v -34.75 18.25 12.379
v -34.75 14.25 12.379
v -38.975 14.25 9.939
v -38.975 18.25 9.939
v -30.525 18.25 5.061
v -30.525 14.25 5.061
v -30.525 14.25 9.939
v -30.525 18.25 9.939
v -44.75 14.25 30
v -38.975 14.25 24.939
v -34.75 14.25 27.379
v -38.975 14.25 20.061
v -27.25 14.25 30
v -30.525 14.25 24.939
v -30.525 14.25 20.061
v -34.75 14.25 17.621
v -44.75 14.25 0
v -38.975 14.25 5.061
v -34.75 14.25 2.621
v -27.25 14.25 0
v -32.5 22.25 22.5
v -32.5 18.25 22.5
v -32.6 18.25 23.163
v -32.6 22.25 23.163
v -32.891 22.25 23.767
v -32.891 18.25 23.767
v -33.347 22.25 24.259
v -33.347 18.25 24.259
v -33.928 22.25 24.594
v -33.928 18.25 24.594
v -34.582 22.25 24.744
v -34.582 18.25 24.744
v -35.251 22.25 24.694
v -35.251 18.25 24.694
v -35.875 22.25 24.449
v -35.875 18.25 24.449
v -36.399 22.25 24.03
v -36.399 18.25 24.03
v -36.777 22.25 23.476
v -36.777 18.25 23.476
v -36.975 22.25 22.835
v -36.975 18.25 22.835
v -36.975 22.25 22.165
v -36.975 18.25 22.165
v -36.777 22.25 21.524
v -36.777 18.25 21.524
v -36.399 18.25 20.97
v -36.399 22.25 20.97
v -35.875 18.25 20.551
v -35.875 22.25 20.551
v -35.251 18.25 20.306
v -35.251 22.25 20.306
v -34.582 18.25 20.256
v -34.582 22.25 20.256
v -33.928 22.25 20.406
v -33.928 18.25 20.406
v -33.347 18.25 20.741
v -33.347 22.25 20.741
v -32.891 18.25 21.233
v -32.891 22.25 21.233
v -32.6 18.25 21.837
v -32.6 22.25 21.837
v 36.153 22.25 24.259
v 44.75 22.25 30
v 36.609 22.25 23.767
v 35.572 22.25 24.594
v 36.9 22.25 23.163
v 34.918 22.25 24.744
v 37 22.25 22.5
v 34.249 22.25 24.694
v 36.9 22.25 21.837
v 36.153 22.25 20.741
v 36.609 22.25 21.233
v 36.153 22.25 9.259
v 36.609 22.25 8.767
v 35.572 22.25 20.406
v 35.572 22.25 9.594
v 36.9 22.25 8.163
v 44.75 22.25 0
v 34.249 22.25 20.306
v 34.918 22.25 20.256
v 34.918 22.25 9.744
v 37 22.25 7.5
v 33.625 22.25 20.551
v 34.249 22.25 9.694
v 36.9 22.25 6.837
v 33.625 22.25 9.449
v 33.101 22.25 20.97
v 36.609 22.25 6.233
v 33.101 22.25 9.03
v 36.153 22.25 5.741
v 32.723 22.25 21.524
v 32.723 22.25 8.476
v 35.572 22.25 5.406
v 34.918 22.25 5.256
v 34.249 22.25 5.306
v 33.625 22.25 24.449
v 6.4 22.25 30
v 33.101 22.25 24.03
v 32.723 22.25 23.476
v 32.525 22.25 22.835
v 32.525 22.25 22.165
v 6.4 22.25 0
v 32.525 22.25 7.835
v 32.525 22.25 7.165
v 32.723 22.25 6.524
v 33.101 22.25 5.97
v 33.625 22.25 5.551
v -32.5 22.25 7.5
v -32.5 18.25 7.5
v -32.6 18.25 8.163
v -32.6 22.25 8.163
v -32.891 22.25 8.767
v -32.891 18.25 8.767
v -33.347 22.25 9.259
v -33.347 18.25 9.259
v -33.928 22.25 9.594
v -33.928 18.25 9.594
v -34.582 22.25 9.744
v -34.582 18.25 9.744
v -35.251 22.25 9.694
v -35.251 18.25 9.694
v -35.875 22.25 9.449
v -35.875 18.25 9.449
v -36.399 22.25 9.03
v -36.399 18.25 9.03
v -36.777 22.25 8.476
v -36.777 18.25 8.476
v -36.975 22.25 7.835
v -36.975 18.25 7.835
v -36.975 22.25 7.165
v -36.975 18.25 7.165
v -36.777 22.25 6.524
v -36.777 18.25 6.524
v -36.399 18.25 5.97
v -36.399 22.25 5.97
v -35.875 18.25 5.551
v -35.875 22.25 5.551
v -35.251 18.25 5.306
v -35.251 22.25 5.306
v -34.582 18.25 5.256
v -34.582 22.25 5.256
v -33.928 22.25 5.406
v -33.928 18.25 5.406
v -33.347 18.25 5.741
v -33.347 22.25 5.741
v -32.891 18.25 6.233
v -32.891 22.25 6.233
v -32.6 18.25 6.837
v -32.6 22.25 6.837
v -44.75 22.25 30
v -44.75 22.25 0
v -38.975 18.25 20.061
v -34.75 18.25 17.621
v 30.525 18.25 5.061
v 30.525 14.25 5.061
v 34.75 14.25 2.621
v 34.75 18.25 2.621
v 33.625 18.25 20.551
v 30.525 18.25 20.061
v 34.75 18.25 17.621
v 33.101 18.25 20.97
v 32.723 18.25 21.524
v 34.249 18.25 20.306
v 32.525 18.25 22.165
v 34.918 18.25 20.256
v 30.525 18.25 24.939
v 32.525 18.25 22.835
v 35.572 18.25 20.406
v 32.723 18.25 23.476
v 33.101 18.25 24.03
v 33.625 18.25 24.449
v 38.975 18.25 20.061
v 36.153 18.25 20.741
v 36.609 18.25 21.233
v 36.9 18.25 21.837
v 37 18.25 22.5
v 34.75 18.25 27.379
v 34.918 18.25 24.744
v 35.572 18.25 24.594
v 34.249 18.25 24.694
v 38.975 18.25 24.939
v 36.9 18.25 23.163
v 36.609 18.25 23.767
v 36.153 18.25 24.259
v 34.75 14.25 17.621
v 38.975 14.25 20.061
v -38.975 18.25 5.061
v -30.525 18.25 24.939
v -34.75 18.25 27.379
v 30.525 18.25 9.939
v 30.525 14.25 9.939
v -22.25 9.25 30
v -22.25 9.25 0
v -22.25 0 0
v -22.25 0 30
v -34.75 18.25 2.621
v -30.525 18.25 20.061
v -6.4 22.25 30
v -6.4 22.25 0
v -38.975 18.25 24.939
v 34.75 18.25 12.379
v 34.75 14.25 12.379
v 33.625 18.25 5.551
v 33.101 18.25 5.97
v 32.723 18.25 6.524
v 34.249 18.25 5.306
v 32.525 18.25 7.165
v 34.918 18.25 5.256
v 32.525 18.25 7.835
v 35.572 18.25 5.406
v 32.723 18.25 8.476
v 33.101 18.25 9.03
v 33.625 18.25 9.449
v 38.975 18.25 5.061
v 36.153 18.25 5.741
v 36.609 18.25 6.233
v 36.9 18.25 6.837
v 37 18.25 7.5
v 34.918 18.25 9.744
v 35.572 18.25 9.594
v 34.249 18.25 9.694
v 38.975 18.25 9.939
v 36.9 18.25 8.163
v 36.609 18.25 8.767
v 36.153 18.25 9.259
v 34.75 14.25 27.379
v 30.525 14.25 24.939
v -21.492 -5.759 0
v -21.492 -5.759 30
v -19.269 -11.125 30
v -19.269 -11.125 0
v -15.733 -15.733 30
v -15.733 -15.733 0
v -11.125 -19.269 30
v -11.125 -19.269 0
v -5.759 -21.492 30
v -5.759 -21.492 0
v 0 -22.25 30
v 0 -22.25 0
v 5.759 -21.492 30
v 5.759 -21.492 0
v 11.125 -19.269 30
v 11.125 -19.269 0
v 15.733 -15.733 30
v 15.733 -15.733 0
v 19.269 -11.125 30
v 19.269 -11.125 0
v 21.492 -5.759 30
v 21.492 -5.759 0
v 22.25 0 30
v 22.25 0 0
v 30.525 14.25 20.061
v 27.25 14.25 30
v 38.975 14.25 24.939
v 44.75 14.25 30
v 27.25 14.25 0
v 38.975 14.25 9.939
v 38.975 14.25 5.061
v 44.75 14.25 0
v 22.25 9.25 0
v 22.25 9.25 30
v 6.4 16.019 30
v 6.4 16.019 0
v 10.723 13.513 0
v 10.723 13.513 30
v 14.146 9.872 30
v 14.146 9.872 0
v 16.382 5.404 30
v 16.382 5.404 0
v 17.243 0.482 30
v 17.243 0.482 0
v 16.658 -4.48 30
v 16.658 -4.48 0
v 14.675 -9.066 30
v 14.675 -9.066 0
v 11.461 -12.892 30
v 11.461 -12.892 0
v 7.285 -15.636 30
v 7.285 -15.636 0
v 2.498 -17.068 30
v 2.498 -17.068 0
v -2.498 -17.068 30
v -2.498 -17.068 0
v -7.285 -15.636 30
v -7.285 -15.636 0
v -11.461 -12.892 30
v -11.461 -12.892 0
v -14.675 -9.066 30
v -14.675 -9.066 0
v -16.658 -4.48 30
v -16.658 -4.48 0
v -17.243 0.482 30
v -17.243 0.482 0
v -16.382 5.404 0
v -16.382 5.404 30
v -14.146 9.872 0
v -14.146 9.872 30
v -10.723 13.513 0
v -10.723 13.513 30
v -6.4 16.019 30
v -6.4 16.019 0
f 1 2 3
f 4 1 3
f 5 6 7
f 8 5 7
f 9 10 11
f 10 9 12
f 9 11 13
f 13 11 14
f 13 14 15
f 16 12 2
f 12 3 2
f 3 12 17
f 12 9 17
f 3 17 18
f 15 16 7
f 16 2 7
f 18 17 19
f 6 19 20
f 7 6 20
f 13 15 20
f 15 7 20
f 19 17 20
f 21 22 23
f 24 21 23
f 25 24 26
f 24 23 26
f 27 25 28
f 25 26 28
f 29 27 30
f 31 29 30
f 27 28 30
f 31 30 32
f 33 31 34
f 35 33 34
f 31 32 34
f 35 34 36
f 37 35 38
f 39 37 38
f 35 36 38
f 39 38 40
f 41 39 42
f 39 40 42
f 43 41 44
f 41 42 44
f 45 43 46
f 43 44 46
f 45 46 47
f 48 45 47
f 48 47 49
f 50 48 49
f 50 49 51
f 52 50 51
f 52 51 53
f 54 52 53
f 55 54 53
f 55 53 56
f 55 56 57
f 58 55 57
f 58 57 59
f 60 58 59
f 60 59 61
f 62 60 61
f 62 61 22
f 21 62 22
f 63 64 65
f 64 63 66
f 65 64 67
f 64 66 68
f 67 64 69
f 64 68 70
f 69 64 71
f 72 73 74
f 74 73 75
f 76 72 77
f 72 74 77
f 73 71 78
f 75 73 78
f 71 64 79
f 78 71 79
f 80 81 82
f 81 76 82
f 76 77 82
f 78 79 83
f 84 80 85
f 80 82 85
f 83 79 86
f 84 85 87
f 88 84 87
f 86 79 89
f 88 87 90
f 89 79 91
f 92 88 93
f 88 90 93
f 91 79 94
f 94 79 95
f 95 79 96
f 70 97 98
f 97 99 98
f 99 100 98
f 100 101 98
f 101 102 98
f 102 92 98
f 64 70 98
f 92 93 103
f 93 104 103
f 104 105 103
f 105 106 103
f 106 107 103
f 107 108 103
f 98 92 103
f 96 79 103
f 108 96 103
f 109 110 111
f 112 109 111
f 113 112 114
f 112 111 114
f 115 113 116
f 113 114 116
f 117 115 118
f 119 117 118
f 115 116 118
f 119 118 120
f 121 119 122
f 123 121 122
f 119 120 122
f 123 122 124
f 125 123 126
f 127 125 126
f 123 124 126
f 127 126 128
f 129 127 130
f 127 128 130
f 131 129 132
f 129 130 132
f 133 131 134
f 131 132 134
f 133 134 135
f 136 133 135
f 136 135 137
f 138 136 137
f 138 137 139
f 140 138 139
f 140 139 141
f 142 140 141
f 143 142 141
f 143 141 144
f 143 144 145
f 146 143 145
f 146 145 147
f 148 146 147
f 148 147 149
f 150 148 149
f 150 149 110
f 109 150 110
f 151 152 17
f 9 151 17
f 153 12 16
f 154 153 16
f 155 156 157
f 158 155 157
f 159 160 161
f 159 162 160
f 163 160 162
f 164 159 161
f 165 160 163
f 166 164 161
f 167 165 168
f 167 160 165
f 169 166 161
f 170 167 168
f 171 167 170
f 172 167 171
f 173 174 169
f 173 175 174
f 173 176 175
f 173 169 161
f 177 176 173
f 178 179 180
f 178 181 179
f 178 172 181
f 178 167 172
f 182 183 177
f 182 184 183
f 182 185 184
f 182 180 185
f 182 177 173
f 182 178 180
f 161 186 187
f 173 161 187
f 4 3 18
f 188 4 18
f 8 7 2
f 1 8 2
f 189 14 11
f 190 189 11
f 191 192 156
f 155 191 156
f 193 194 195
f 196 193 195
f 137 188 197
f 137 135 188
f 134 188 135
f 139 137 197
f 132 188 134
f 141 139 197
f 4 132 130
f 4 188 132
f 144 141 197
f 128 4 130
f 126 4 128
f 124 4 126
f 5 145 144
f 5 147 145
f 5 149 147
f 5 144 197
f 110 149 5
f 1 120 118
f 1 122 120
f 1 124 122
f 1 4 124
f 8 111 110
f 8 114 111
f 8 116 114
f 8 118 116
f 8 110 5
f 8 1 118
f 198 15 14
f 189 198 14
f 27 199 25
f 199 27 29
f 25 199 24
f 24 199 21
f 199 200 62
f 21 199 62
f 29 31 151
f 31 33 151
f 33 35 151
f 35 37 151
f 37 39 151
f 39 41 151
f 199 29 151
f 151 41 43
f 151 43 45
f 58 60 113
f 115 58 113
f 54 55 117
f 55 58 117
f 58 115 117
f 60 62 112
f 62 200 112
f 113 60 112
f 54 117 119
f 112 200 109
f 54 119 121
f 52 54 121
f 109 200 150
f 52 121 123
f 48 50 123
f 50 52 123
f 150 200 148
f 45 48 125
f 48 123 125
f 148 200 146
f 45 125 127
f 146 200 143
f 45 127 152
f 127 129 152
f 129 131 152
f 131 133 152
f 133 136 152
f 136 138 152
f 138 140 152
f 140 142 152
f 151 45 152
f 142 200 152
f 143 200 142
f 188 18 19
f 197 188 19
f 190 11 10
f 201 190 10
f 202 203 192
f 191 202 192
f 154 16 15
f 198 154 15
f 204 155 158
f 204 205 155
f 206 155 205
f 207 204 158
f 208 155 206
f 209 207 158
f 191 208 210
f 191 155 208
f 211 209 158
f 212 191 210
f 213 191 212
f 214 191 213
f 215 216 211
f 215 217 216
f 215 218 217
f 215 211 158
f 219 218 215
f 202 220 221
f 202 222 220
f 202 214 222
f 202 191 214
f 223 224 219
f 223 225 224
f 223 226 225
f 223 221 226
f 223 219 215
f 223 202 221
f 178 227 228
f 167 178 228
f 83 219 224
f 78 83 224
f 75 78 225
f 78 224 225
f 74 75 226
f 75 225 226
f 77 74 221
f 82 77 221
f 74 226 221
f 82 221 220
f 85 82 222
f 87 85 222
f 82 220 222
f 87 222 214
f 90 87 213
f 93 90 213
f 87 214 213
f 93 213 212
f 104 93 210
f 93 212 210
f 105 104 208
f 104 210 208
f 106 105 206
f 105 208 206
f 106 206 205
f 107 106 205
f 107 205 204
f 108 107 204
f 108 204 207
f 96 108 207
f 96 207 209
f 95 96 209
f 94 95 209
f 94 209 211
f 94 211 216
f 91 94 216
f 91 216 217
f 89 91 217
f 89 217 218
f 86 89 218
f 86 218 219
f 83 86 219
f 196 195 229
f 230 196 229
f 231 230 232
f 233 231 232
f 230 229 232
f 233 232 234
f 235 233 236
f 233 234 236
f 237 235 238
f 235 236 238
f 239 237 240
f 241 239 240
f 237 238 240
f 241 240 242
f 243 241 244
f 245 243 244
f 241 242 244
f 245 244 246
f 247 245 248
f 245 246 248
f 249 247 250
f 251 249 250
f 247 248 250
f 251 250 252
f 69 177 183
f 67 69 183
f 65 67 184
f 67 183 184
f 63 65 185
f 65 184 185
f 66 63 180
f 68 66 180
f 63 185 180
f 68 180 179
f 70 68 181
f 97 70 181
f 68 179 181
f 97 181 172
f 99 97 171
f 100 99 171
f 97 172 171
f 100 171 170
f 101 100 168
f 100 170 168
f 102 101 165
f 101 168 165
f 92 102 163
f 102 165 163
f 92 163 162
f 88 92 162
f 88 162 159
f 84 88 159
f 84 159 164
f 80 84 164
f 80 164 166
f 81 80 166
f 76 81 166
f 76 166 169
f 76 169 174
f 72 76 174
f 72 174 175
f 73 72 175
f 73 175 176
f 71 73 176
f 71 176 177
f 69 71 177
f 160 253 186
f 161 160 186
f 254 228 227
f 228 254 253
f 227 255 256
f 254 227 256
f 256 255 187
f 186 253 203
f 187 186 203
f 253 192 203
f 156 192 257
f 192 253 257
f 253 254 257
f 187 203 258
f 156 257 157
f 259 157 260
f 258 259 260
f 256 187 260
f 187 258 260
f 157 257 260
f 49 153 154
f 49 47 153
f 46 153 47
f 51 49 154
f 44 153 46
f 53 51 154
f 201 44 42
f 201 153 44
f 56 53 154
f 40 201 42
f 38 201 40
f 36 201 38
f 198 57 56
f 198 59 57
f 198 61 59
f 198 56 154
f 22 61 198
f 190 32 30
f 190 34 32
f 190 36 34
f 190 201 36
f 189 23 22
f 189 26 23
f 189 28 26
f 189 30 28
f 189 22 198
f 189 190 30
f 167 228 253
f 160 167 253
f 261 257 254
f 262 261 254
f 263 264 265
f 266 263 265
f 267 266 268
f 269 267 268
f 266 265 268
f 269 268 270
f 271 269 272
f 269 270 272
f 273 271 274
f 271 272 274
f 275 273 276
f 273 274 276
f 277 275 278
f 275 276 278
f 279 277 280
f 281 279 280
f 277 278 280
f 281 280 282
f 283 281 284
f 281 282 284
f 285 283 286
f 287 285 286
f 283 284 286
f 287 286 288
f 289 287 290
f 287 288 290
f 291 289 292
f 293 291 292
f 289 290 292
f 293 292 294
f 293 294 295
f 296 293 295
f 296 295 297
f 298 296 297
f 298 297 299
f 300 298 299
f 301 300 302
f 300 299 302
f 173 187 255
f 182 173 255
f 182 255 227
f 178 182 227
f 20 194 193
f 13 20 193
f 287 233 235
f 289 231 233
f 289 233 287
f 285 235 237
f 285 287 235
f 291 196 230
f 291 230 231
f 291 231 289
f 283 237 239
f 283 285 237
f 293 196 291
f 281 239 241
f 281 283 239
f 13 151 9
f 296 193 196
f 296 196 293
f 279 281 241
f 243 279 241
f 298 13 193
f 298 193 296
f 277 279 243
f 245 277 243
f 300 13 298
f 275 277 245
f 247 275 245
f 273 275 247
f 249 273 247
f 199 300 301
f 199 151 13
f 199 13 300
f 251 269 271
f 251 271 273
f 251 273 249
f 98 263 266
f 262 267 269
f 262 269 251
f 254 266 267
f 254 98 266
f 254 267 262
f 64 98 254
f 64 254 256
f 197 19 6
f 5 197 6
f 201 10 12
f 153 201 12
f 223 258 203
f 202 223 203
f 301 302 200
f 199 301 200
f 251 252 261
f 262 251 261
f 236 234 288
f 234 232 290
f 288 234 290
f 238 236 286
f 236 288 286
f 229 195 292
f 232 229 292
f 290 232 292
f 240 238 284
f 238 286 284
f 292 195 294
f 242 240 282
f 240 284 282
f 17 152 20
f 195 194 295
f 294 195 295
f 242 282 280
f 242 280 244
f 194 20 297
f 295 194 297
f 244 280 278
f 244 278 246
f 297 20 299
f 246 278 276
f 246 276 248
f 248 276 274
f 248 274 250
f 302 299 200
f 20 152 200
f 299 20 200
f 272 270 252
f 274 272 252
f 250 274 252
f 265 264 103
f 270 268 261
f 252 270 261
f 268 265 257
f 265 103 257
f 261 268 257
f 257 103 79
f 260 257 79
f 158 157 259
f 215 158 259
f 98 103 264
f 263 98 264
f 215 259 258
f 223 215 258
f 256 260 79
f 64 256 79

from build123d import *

# Parameters (mm, degrees)
F1_DEPTH = 30
F2_R     = 2.25
F3_DEPTH = 25
F5_DEPTH = 4
F6_SIZE  = 5


with BuildPart() as f1:
    # F0 (on Top) → F1 (new body)
    with BuildSketch(Plane.XY):
        with BuildLine():
            ThreePointArc((6.4, 16.018817), (0, -17.25), (-6.4, 16.018817))
            Line((-6.4, 16.018817), (-6.4, 22.25))
            Line((-6.4, 22.25), (-44.75, 22.25))
            Line((-44.75, 22.25), (-44.75, 14.25))
            Line((-44.75, 14.25), (-22.25, 14.25))
            Line((-22.25, 14.25), (-22.25, 0))
            ThreePointArc((-22.25, 0), (0, -22.25), (22.25, 0))
            Line((22.25, 0), (22.25, 14.25))
            Line((22.25, 14.25), (44.75, 14.25))
            Line((44.75, 14.25), (44.75, 22.25))
            Line((44.75, 22.25), (6.4, 22.25))
            Line((6.4, 22.25), (6.4, 16.018817))
        make_face()
    extrude(amount=F1_DEPTH)

    # F2 (on face) → F3 (cut)
    with BuildSketch(Plane.XZ.offset(-14.25)):
        with Locations((-34.75, 22.5)):
            Circle(F2_R)
        with Locations((-34.75, 7.5)):
            Circle(F2_R)
        with Locations((34.75, 22.5)):
            Circle(F2_R)
        with Locations((34.75, 7.5)):
            Circle(F2_R)
    extrude(amount=-F3_DEPTH, mode=Mode.SUBTRACT)

    # F4 (on face) → F5 (cut)
    with BuildSketch(Plane.XZ.offset(-14.25)):
        Polygon((-30.525, 20.060695), (-30.525, 24.939305), (-34.75, 27.37861), (-38.975, 24.939305), (-38.975, 20.060695), (-34.75, 17.62139), align=None)
        Polygon((-30.525, 5.060695), (-30.525, 9.939305), (-34.75, 12.37861), (-38.975, 9.939305), (-38.975, 5.060695), (-34.75, 2.62139), align=None)
        Polygon((38.975, 5.060695), (38.975, 9.939305), (34.75, 12.37861), (30.525, 9.939305), (30.525, 5.060695), (34.75, 2.62139), align=None)
        Polygon((34.75, 27.37861), (30.525, 24.939305), (30.525, 20.060695), (34.75, 17.62139), (38.975, 20.060695), (38.975, 24.939305), align=None)
    extrude(amount=-F5_DEPTH, mode=Mode.SUBTRACT)

    # F6
    f6_edges = [f1.edges().sort_by_distance(p)[0] for p in [
        (-22.25, 14.25, 15),
        (22.25, 14.25, 15),
    ]]
    chamfer(f6_edges, length=F6_SIZE)


solid = f1.part
